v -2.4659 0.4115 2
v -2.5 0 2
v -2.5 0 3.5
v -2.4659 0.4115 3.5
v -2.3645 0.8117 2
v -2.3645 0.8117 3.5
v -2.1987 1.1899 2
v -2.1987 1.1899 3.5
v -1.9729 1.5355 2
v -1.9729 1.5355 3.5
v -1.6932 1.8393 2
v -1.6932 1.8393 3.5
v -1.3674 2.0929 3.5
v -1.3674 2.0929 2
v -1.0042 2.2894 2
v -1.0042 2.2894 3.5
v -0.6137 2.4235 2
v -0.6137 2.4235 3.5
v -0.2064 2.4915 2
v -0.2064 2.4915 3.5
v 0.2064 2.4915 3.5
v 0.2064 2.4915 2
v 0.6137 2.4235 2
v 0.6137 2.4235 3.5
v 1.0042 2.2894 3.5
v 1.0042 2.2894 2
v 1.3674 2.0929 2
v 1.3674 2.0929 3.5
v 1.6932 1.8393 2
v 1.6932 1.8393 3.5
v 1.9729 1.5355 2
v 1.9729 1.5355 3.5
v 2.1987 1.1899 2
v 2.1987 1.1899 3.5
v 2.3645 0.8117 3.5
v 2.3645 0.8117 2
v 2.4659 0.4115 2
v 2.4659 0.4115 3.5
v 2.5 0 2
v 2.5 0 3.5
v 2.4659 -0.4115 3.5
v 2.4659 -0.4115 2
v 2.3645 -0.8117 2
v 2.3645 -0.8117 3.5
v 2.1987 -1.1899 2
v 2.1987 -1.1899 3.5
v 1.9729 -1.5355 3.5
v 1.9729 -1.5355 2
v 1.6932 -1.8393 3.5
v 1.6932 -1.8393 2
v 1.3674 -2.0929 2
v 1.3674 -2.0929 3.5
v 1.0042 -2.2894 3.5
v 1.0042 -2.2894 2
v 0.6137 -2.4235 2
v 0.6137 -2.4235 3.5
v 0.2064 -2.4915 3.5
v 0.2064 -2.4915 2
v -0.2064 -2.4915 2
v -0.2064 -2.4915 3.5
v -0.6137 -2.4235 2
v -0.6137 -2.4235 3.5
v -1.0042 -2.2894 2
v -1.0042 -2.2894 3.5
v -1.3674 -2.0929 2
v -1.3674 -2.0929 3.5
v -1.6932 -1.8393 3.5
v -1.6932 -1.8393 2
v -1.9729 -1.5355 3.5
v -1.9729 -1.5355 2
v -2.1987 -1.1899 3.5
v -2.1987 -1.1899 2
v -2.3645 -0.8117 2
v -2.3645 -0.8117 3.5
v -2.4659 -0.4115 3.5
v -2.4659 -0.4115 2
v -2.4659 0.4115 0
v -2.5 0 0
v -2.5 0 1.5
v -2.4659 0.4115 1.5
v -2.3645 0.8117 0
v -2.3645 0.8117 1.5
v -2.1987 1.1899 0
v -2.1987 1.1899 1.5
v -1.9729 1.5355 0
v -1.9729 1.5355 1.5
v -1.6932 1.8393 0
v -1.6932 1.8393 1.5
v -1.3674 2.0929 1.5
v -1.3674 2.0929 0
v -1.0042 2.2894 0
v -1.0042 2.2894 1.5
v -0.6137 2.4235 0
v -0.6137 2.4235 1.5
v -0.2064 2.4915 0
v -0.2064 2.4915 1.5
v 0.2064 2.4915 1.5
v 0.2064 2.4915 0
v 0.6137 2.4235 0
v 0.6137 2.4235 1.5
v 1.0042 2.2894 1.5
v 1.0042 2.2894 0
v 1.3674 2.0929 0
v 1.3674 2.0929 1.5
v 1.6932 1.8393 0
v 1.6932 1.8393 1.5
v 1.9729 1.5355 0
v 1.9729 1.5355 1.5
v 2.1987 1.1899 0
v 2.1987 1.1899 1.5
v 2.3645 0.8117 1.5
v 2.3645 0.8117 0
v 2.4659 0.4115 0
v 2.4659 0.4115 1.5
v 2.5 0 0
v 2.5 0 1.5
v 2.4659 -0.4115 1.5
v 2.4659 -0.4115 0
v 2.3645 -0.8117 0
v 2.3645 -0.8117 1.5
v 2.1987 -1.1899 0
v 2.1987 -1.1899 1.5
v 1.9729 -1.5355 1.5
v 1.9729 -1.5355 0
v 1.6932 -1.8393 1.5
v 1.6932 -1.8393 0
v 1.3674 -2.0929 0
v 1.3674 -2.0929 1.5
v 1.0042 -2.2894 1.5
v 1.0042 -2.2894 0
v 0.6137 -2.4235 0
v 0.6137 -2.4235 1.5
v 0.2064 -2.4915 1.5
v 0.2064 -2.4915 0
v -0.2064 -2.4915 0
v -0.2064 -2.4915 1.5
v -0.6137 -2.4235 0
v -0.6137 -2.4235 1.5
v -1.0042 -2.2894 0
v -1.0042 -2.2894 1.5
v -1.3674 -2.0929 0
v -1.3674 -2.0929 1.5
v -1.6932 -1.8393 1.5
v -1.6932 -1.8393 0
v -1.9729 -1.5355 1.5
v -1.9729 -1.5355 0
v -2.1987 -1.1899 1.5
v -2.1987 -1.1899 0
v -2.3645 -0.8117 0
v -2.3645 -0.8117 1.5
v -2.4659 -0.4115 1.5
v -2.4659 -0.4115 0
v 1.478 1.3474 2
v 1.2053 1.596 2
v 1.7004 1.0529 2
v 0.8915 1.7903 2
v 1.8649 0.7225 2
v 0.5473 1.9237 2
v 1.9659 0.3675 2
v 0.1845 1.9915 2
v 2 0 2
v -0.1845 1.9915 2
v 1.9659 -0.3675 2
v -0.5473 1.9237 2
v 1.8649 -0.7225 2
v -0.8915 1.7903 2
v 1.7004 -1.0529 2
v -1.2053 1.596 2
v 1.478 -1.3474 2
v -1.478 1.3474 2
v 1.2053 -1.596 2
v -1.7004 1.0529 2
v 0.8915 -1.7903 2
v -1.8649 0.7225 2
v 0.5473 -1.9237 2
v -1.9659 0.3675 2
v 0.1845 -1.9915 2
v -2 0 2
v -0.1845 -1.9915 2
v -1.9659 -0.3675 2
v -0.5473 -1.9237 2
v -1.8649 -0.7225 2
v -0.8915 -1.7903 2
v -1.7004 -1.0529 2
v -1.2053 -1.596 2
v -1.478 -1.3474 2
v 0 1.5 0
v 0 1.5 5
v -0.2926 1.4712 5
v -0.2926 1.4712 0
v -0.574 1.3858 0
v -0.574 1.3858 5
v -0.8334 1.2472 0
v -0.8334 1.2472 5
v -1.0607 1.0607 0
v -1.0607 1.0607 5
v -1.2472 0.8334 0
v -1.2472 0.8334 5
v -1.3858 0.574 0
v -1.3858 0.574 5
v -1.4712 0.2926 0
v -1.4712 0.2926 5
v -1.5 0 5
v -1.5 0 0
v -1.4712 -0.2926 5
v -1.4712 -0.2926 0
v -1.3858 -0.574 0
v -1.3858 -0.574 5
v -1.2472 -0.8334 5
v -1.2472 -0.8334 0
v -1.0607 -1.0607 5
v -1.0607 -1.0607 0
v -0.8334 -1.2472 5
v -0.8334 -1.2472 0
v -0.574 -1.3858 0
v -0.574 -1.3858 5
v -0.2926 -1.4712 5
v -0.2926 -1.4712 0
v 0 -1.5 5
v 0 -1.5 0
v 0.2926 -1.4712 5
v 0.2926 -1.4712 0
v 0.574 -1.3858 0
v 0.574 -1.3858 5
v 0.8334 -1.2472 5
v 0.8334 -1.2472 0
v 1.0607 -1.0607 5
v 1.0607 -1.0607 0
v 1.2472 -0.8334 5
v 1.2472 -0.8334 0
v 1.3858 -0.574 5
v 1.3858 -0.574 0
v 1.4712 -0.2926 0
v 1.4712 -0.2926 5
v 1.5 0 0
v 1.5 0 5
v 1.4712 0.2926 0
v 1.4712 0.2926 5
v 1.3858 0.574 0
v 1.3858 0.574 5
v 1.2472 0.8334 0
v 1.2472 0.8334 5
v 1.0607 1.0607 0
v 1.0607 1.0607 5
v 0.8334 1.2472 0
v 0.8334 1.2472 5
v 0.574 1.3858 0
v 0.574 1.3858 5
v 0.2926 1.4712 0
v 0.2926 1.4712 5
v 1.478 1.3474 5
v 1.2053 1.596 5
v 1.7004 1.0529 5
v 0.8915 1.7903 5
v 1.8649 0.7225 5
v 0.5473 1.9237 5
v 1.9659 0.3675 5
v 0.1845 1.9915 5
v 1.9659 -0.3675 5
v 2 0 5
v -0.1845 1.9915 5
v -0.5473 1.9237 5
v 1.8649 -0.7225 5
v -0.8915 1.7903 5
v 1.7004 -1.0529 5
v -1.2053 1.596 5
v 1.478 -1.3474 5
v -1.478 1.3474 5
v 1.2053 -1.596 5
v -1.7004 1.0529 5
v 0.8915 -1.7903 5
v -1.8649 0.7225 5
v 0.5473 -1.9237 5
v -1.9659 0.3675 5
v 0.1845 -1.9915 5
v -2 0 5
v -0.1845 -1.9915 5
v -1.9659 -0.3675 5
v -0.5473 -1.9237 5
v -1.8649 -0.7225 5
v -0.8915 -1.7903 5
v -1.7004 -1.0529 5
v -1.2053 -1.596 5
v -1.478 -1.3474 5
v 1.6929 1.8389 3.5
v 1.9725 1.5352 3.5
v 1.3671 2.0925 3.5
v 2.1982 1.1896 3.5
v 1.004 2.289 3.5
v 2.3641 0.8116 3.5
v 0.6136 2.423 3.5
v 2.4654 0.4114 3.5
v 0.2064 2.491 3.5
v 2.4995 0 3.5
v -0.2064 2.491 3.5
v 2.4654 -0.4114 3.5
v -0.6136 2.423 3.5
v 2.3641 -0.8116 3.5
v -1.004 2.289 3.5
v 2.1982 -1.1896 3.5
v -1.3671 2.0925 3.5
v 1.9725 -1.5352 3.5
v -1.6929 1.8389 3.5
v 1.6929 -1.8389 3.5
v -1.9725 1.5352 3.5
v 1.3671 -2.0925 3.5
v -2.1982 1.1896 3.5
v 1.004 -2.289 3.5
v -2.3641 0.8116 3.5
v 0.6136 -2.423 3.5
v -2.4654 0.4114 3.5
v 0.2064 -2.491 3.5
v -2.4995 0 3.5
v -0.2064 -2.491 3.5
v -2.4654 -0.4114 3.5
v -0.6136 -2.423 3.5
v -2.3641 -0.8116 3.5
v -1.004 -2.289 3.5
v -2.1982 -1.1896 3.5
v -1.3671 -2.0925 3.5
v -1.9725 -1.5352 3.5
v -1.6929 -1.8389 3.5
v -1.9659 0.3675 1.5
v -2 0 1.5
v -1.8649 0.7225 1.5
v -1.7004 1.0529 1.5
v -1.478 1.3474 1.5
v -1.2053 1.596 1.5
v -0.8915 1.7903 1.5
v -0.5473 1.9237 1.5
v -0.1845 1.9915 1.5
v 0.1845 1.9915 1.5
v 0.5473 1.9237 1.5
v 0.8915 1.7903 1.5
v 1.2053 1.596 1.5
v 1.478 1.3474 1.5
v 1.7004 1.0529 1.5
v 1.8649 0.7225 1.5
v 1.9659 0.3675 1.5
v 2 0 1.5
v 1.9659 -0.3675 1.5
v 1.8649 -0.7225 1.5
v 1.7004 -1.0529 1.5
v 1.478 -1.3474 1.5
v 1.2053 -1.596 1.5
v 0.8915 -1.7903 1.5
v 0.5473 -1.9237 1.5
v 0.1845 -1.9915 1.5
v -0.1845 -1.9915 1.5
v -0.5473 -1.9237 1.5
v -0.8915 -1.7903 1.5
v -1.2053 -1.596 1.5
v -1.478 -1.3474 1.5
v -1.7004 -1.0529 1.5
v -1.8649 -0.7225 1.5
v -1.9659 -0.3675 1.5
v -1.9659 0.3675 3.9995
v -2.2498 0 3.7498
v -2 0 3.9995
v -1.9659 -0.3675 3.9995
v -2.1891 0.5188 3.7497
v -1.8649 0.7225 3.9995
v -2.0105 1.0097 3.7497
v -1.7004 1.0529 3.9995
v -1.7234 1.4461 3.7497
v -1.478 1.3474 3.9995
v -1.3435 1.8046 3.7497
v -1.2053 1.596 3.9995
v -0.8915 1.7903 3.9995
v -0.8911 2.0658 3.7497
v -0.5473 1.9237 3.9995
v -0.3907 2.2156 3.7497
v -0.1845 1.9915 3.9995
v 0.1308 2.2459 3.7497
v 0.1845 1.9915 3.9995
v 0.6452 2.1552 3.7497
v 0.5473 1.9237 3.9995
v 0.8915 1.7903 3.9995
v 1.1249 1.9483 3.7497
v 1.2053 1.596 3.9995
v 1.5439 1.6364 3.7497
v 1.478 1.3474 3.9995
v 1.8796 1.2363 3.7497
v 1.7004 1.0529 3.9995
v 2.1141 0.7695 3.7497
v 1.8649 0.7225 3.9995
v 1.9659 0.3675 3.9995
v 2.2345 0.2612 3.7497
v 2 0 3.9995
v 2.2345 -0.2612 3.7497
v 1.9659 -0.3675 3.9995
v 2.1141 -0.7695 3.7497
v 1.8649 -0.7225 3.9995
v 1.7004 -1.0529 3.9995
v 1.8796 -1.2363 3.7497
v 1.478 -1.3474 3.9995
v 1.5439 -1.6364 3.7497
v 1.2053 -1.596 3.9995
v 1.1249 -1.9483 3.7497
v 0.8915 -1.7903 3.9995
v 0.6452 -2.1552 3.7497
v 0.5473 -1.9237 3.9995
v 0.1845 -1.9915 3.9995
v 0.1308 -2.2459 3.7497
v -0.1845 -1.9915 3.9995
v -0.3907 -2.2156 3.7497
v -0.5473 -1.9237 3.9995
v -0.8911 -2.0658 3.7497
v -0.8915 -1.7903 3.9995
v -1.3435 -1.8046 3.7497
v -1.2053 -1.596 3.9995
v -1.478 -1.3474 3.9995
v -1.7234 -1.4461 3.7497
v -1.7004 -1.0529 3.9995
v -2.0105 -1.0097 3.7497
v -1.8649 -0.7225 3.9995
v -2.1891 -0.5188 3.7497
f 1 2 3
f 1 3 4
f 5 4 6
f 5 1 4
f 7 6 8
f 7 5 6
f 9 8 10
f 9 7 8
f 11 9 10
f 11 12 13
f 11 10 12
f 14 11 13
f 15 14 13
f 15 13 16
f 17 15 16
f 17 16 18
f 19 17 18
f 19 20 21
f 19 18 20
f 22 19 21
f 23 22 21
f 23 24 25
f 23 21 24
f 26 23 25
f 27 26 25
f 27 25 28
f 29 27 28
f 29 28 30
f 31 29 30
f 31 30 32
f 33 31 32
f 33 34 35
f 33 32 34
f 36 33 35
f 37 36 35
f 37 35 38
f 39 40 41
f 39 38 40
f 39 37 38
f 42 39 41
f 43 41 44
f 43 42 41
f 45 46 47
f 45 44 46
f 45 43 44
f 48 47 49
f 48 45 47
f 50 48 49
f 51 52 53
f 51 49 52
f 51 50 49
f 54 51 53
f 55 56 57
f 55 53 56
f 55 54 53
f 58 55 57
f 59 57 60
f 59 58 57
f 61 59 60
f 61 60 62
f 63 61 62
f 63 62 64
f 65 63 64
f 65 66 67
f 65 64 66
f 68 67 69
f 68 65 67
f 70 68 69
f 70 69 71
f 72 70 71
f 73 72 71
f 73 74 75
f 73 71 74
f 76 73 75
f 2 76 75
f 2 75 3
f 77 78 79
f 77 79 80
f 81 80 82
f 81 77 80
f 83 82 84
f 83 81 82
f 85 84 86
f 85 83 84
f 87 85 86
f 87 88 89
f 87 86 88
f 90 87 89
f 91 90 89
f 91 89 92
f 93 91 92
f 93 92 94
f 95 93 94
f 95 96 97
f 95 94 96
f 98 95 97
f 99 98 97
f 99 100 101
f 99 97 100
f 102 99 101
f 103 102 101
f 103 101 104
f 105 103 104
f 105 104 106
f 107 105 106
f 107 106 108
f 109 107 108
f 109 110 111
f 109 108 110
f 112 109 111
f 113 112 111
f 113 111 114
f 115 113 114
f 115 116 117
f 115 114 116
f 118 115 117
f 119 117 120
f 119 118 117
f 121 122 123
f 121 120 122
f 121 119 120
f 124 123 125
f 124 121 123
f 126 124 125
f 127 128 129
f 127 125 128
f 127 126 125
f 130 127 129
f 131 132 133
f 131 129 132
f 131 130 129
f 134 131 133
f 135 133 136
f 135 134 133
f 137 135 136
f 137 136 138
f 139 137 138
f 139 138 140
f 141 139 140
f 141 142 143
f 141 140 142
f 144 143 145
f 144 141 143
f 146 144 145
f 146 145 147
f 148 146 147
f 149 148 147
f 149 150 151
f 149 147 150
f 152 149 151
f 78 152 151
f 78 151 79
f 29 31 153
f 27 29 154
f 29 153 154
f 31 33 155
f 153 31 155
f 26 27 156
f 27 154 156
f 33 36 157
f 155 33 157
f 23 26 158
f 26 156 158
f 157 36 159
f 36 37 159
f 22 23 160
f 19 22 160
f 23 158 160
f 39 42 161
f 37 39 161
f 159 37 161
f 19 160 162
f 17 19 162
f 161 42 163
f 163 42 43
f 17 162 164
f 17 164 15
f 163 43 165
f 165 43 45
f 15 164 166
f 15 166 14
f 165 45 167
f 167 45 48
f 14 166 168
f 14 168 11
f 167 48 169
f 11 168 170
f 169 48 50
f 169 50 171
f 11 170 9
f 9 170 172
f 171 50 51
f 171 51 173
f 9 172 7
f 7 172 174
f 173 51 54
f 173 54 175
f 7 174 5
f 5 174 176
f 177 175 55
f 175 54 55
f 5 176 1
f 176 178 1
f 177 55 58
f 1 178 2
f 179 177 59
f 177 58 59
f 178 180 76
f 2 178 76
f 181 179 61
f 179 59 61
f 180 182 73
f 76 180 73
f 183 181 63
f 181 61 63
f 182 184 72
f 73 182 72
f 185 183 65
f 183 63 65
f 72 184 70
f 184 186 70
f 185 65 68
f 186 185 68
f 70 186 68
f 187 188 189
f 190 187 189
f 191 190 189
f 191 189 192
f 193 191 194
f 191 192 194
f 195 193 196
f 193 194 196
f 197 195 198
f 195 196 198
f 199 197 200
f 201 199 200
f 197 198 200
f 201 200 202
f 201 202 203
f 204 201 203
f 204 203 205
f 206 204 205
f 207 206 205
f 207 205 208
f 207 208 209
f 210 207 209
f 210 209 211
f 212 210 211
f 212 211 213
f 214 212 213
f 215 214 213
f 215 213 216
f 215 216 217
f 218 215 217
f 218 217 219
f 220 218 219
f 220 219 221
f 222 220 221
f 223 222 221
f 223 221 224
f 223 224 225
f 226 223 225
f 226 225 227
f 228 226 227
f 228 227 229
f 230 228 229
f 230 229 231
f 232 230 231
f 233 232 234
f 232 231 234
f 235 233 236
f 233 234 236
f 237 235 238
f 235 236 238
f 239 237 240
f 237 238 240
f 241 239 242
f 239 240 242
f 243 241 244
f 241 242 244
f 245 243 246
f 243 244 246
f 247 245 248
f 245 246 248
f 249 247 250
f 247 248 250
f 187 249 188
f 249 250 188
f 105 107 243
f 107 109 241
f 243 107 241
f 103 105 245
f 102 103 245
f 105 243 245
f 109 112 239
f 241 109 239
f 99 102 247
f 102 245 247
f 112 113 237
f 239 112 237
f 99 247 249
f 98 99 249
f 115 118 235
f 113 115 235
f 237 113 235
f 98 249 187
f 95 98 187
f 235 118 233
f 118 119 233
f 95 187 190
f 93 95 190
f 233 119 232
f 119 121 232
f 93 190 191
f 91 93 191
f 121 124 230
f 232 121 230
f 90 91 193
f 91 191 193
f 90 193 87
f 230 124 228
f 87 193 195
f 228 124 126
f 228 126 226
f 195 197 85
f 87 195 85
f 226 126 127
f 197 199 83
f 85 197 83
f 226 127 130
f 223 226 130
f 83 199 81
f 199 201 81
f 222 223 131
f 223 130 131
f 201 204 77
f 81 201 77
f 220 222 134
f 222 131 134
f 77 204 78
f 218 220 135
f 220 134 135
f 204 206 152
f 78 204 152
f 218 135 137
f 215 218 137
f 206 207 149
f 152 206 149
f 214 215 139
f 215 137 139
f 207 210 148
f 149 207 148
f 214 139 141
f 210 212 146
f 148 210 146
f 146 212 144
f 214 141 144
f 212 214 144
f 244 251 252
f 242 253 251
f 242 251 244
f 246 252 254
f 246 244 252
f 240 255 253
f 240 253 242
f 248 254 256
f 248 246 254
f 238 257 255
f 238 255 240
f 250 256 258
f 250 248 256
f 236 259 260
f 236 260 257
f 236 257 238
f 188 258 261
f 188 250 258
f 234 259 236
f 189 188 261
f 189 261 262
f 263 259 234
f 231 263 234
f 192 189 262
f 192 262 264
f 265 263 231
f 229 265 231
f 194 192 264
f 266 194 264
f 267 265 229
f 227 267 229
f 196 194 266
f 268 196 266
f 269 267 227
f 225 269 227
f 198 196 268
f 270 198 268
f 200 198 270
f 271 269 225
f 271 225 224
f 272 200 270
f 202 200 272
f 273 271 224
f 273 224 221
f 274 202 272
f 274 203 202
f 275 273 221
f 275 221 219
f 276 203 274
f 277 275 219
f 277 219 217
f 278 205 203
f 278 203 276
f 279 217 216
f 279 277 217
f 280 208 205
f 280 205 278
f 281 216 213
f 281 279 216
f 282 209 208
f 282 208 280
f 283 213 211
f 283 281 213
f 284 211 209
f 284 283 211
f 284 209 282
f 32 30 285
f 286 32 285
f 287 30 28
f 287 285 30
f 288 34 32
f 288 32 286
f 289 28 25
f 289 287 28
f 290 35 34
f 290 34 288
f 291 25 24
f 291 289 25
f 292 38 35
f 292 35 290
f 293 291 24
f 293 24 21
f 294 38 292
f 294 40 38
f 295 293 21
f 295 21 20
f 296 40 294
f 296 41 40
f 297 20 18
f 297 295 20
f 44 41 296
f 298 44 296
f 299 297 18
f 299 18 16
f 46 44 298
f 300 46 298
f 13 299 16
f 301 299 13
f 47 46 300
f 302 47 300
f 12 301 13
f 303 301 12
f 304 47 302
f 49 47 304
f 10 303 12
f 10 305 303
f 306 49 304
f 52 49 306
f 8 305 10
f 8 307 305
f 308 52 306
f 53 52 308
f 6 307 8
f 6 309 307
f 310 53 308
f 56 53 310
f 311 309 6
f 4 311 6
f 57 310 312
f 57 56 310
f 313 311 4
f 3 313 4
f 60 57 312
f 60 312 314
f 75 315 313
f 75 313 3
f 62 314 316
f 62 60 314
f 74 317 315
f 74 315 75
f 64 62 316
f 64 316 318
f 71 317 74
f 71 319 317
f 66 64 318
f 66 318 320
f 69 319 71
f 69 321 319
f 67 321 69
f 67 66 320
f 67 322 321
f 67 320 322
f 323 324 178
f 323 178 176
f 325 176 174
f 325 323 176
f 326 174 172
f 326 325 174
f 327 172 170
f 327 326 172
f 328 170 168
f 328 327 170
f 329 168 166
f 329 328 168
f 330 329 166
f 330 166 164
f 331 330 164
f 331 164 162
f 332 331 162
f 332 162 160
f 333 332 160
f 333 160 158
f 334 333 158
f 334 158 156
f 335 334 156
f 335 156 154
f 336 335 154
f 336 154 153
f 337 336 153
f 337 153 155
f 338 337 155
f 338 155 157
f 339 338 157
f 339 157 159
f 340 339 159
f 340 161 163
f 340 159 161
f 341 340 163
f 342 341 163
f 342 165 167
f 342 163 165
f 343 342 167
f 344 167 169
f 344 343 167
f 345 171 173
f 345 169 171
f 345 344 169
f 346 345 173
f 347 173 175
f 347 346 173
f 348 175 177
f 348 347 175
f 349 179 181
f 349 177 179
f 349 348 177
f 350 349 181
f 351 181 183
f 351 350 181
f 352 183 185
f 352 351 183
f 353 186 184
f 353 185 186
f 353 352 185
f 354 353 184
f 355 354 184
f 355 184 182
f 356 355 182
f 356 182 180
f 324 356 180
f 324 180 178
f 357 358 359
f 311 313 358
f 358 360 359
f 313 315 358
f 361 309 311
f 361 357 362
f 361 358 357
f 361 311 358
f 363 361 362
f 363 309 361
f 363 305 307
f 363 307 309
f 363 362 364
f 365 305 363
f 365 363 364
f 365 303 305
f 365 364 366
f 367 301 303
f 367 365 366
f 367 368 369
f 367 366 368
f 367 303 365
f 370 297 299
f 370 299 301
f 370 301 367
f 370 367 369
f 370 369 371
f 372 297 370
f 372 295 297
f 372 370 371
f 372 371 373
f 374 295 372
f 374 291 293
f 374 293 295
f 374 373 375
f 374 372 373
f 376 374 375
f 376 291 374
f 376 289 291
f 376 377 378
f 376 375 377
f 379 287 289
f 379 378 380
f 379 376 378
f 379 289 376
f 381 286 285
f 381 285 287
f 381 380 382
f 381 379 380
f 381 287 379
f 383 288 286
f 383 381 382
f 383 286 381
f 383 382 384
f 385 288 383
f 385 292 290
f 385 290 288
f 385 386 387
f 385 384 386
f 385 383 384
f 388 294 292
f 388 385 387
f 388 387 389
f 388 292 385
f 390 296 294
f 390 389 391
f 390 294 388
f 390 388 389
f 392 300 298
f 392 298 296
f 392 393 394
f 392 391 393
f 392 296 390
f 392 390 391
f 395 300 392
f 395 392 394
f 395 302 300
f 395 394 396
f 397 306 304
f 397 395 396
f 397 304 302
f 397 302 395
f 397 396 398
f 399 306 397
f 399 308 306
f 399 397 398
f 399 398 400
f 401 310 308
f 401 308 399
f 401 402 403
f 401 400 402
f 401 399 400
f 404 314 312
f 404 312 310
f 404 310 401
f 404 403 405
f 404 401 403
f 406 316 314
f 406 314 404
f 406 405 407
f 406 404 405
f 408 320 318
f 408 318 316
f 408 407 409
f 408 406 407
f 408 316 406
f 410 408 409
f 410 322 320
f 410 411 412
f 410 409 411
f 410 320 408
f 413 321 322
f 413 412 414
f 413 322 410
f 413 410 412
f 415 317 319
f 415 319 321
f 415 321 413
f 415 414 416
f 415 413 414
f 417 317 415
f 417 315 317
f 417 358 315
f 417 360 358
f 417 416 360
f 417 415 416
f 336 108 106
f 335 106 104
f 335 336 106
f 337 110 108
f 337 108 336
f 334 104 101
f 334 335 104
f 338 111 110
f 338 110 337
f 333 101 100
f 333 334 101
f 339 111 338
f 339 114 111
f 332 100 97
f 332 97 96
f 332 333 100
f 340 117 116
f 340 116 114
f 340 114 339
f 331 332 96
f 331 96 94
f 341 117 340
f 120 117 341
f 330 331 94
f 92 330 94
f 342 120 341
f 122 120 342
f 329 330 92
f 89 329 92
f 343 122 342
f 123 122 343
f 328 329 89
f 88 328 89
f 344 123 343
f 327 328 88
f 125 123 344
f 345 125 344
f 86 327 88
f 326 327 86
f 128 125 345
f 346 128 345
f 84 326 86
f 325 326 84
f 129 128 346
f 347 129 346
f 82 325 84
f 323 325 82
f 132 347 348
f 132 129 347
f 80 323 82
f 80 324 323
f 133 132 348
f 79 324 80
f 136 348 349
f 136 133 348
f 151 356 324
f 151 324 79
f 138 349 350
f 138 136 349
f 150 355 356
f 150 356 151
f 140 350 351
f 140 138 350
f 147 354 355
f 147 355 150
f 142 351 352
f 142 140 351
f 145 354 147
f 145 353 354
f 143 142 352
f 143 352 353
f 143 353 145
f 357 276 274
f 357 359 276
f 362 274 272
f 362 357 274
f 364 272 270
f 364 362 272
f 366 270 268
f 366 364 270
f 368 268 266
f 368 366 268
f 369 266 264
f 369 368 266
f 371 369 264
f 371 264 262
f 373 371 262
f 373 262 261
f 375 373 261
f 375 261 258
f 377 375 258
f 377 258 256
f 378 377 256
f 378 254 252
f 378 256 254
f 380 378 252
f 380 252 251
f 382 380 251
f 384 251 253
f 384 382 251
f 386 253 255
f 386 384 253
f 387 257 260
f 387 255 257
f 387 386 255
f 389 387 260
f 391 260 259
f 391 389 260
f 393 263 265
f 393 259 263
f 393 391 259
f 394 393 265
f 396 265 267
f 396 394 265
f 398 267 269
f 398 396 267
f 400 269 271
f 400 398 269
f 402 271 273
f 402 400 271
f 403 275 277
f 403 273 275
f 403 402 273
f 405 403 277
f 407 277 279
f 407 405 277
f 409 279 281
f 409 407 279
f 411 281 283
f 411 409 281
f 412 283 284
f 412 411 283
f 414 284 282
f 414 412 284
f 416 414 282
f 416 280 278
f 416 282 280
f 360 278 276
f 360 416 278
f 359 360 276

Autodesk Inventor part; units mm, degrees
ref_plane "YZ Plane" through (0, 0, 0) normal (1, 0, 0) x (0, 1, 0)
ref_plane "XZ Plane" through (0, 0, 0) normal (0, 1, 0) x (-1, 0, 0)
ref_plane "XY Plane" through (0, 0, 0) normal (0, 0, 1) x (1, 0, 0)
sketch "Sketch1" plane through (0, 0, 0) normal (0, 1, 0) x (-1, 0, 0)
  line L0 (0, 0) -> (0, 5)
  line L1 (0, 5) -> (2, 5)
  line L2 (2, 5) -> (2, 3.5)
  line L3 (2, 3.5) -> (2.5, 3.5)
  line L4 (2.5, 3.5) -> (2.5, 2)
  line L5 (2.5, 2) -> (2, 2)
  line L6 (2, 2) -> (2, 1.5)
  line L7 (2, 1.5) -> (2.5, 1.5)
  line L8 (2.5, 1.5) -> (2.5, 0)
  line L9 (2.5, 0) -> (0, 0)
  dimension "d0" = 5
  dimension "d1" = 5
  dimension "d2" = 4
  dimension "d3" = 1.5
  dimension "d4" = 0.5
  dimension "d5" = 1.5
revolve "Revolution1" add sketch "Sketch1" angle 360 about axis through (0, 0, 0) along (0, 0, 1)
chamfer "Chamfer1" distance 0.5 angle 45 1 edges at (2, 0, 3.5)
hole "Hole1" at (0, 0, 0) direction (0, 0, 1) diameter 3 depth 6 tip angle 118
thread "Thread1" size "M3x0.5" class "6H" standard "ANSI Metric M Profile" full length
properties part number "brass-insert-m3x5" material "Brass, Soft Yellow"
